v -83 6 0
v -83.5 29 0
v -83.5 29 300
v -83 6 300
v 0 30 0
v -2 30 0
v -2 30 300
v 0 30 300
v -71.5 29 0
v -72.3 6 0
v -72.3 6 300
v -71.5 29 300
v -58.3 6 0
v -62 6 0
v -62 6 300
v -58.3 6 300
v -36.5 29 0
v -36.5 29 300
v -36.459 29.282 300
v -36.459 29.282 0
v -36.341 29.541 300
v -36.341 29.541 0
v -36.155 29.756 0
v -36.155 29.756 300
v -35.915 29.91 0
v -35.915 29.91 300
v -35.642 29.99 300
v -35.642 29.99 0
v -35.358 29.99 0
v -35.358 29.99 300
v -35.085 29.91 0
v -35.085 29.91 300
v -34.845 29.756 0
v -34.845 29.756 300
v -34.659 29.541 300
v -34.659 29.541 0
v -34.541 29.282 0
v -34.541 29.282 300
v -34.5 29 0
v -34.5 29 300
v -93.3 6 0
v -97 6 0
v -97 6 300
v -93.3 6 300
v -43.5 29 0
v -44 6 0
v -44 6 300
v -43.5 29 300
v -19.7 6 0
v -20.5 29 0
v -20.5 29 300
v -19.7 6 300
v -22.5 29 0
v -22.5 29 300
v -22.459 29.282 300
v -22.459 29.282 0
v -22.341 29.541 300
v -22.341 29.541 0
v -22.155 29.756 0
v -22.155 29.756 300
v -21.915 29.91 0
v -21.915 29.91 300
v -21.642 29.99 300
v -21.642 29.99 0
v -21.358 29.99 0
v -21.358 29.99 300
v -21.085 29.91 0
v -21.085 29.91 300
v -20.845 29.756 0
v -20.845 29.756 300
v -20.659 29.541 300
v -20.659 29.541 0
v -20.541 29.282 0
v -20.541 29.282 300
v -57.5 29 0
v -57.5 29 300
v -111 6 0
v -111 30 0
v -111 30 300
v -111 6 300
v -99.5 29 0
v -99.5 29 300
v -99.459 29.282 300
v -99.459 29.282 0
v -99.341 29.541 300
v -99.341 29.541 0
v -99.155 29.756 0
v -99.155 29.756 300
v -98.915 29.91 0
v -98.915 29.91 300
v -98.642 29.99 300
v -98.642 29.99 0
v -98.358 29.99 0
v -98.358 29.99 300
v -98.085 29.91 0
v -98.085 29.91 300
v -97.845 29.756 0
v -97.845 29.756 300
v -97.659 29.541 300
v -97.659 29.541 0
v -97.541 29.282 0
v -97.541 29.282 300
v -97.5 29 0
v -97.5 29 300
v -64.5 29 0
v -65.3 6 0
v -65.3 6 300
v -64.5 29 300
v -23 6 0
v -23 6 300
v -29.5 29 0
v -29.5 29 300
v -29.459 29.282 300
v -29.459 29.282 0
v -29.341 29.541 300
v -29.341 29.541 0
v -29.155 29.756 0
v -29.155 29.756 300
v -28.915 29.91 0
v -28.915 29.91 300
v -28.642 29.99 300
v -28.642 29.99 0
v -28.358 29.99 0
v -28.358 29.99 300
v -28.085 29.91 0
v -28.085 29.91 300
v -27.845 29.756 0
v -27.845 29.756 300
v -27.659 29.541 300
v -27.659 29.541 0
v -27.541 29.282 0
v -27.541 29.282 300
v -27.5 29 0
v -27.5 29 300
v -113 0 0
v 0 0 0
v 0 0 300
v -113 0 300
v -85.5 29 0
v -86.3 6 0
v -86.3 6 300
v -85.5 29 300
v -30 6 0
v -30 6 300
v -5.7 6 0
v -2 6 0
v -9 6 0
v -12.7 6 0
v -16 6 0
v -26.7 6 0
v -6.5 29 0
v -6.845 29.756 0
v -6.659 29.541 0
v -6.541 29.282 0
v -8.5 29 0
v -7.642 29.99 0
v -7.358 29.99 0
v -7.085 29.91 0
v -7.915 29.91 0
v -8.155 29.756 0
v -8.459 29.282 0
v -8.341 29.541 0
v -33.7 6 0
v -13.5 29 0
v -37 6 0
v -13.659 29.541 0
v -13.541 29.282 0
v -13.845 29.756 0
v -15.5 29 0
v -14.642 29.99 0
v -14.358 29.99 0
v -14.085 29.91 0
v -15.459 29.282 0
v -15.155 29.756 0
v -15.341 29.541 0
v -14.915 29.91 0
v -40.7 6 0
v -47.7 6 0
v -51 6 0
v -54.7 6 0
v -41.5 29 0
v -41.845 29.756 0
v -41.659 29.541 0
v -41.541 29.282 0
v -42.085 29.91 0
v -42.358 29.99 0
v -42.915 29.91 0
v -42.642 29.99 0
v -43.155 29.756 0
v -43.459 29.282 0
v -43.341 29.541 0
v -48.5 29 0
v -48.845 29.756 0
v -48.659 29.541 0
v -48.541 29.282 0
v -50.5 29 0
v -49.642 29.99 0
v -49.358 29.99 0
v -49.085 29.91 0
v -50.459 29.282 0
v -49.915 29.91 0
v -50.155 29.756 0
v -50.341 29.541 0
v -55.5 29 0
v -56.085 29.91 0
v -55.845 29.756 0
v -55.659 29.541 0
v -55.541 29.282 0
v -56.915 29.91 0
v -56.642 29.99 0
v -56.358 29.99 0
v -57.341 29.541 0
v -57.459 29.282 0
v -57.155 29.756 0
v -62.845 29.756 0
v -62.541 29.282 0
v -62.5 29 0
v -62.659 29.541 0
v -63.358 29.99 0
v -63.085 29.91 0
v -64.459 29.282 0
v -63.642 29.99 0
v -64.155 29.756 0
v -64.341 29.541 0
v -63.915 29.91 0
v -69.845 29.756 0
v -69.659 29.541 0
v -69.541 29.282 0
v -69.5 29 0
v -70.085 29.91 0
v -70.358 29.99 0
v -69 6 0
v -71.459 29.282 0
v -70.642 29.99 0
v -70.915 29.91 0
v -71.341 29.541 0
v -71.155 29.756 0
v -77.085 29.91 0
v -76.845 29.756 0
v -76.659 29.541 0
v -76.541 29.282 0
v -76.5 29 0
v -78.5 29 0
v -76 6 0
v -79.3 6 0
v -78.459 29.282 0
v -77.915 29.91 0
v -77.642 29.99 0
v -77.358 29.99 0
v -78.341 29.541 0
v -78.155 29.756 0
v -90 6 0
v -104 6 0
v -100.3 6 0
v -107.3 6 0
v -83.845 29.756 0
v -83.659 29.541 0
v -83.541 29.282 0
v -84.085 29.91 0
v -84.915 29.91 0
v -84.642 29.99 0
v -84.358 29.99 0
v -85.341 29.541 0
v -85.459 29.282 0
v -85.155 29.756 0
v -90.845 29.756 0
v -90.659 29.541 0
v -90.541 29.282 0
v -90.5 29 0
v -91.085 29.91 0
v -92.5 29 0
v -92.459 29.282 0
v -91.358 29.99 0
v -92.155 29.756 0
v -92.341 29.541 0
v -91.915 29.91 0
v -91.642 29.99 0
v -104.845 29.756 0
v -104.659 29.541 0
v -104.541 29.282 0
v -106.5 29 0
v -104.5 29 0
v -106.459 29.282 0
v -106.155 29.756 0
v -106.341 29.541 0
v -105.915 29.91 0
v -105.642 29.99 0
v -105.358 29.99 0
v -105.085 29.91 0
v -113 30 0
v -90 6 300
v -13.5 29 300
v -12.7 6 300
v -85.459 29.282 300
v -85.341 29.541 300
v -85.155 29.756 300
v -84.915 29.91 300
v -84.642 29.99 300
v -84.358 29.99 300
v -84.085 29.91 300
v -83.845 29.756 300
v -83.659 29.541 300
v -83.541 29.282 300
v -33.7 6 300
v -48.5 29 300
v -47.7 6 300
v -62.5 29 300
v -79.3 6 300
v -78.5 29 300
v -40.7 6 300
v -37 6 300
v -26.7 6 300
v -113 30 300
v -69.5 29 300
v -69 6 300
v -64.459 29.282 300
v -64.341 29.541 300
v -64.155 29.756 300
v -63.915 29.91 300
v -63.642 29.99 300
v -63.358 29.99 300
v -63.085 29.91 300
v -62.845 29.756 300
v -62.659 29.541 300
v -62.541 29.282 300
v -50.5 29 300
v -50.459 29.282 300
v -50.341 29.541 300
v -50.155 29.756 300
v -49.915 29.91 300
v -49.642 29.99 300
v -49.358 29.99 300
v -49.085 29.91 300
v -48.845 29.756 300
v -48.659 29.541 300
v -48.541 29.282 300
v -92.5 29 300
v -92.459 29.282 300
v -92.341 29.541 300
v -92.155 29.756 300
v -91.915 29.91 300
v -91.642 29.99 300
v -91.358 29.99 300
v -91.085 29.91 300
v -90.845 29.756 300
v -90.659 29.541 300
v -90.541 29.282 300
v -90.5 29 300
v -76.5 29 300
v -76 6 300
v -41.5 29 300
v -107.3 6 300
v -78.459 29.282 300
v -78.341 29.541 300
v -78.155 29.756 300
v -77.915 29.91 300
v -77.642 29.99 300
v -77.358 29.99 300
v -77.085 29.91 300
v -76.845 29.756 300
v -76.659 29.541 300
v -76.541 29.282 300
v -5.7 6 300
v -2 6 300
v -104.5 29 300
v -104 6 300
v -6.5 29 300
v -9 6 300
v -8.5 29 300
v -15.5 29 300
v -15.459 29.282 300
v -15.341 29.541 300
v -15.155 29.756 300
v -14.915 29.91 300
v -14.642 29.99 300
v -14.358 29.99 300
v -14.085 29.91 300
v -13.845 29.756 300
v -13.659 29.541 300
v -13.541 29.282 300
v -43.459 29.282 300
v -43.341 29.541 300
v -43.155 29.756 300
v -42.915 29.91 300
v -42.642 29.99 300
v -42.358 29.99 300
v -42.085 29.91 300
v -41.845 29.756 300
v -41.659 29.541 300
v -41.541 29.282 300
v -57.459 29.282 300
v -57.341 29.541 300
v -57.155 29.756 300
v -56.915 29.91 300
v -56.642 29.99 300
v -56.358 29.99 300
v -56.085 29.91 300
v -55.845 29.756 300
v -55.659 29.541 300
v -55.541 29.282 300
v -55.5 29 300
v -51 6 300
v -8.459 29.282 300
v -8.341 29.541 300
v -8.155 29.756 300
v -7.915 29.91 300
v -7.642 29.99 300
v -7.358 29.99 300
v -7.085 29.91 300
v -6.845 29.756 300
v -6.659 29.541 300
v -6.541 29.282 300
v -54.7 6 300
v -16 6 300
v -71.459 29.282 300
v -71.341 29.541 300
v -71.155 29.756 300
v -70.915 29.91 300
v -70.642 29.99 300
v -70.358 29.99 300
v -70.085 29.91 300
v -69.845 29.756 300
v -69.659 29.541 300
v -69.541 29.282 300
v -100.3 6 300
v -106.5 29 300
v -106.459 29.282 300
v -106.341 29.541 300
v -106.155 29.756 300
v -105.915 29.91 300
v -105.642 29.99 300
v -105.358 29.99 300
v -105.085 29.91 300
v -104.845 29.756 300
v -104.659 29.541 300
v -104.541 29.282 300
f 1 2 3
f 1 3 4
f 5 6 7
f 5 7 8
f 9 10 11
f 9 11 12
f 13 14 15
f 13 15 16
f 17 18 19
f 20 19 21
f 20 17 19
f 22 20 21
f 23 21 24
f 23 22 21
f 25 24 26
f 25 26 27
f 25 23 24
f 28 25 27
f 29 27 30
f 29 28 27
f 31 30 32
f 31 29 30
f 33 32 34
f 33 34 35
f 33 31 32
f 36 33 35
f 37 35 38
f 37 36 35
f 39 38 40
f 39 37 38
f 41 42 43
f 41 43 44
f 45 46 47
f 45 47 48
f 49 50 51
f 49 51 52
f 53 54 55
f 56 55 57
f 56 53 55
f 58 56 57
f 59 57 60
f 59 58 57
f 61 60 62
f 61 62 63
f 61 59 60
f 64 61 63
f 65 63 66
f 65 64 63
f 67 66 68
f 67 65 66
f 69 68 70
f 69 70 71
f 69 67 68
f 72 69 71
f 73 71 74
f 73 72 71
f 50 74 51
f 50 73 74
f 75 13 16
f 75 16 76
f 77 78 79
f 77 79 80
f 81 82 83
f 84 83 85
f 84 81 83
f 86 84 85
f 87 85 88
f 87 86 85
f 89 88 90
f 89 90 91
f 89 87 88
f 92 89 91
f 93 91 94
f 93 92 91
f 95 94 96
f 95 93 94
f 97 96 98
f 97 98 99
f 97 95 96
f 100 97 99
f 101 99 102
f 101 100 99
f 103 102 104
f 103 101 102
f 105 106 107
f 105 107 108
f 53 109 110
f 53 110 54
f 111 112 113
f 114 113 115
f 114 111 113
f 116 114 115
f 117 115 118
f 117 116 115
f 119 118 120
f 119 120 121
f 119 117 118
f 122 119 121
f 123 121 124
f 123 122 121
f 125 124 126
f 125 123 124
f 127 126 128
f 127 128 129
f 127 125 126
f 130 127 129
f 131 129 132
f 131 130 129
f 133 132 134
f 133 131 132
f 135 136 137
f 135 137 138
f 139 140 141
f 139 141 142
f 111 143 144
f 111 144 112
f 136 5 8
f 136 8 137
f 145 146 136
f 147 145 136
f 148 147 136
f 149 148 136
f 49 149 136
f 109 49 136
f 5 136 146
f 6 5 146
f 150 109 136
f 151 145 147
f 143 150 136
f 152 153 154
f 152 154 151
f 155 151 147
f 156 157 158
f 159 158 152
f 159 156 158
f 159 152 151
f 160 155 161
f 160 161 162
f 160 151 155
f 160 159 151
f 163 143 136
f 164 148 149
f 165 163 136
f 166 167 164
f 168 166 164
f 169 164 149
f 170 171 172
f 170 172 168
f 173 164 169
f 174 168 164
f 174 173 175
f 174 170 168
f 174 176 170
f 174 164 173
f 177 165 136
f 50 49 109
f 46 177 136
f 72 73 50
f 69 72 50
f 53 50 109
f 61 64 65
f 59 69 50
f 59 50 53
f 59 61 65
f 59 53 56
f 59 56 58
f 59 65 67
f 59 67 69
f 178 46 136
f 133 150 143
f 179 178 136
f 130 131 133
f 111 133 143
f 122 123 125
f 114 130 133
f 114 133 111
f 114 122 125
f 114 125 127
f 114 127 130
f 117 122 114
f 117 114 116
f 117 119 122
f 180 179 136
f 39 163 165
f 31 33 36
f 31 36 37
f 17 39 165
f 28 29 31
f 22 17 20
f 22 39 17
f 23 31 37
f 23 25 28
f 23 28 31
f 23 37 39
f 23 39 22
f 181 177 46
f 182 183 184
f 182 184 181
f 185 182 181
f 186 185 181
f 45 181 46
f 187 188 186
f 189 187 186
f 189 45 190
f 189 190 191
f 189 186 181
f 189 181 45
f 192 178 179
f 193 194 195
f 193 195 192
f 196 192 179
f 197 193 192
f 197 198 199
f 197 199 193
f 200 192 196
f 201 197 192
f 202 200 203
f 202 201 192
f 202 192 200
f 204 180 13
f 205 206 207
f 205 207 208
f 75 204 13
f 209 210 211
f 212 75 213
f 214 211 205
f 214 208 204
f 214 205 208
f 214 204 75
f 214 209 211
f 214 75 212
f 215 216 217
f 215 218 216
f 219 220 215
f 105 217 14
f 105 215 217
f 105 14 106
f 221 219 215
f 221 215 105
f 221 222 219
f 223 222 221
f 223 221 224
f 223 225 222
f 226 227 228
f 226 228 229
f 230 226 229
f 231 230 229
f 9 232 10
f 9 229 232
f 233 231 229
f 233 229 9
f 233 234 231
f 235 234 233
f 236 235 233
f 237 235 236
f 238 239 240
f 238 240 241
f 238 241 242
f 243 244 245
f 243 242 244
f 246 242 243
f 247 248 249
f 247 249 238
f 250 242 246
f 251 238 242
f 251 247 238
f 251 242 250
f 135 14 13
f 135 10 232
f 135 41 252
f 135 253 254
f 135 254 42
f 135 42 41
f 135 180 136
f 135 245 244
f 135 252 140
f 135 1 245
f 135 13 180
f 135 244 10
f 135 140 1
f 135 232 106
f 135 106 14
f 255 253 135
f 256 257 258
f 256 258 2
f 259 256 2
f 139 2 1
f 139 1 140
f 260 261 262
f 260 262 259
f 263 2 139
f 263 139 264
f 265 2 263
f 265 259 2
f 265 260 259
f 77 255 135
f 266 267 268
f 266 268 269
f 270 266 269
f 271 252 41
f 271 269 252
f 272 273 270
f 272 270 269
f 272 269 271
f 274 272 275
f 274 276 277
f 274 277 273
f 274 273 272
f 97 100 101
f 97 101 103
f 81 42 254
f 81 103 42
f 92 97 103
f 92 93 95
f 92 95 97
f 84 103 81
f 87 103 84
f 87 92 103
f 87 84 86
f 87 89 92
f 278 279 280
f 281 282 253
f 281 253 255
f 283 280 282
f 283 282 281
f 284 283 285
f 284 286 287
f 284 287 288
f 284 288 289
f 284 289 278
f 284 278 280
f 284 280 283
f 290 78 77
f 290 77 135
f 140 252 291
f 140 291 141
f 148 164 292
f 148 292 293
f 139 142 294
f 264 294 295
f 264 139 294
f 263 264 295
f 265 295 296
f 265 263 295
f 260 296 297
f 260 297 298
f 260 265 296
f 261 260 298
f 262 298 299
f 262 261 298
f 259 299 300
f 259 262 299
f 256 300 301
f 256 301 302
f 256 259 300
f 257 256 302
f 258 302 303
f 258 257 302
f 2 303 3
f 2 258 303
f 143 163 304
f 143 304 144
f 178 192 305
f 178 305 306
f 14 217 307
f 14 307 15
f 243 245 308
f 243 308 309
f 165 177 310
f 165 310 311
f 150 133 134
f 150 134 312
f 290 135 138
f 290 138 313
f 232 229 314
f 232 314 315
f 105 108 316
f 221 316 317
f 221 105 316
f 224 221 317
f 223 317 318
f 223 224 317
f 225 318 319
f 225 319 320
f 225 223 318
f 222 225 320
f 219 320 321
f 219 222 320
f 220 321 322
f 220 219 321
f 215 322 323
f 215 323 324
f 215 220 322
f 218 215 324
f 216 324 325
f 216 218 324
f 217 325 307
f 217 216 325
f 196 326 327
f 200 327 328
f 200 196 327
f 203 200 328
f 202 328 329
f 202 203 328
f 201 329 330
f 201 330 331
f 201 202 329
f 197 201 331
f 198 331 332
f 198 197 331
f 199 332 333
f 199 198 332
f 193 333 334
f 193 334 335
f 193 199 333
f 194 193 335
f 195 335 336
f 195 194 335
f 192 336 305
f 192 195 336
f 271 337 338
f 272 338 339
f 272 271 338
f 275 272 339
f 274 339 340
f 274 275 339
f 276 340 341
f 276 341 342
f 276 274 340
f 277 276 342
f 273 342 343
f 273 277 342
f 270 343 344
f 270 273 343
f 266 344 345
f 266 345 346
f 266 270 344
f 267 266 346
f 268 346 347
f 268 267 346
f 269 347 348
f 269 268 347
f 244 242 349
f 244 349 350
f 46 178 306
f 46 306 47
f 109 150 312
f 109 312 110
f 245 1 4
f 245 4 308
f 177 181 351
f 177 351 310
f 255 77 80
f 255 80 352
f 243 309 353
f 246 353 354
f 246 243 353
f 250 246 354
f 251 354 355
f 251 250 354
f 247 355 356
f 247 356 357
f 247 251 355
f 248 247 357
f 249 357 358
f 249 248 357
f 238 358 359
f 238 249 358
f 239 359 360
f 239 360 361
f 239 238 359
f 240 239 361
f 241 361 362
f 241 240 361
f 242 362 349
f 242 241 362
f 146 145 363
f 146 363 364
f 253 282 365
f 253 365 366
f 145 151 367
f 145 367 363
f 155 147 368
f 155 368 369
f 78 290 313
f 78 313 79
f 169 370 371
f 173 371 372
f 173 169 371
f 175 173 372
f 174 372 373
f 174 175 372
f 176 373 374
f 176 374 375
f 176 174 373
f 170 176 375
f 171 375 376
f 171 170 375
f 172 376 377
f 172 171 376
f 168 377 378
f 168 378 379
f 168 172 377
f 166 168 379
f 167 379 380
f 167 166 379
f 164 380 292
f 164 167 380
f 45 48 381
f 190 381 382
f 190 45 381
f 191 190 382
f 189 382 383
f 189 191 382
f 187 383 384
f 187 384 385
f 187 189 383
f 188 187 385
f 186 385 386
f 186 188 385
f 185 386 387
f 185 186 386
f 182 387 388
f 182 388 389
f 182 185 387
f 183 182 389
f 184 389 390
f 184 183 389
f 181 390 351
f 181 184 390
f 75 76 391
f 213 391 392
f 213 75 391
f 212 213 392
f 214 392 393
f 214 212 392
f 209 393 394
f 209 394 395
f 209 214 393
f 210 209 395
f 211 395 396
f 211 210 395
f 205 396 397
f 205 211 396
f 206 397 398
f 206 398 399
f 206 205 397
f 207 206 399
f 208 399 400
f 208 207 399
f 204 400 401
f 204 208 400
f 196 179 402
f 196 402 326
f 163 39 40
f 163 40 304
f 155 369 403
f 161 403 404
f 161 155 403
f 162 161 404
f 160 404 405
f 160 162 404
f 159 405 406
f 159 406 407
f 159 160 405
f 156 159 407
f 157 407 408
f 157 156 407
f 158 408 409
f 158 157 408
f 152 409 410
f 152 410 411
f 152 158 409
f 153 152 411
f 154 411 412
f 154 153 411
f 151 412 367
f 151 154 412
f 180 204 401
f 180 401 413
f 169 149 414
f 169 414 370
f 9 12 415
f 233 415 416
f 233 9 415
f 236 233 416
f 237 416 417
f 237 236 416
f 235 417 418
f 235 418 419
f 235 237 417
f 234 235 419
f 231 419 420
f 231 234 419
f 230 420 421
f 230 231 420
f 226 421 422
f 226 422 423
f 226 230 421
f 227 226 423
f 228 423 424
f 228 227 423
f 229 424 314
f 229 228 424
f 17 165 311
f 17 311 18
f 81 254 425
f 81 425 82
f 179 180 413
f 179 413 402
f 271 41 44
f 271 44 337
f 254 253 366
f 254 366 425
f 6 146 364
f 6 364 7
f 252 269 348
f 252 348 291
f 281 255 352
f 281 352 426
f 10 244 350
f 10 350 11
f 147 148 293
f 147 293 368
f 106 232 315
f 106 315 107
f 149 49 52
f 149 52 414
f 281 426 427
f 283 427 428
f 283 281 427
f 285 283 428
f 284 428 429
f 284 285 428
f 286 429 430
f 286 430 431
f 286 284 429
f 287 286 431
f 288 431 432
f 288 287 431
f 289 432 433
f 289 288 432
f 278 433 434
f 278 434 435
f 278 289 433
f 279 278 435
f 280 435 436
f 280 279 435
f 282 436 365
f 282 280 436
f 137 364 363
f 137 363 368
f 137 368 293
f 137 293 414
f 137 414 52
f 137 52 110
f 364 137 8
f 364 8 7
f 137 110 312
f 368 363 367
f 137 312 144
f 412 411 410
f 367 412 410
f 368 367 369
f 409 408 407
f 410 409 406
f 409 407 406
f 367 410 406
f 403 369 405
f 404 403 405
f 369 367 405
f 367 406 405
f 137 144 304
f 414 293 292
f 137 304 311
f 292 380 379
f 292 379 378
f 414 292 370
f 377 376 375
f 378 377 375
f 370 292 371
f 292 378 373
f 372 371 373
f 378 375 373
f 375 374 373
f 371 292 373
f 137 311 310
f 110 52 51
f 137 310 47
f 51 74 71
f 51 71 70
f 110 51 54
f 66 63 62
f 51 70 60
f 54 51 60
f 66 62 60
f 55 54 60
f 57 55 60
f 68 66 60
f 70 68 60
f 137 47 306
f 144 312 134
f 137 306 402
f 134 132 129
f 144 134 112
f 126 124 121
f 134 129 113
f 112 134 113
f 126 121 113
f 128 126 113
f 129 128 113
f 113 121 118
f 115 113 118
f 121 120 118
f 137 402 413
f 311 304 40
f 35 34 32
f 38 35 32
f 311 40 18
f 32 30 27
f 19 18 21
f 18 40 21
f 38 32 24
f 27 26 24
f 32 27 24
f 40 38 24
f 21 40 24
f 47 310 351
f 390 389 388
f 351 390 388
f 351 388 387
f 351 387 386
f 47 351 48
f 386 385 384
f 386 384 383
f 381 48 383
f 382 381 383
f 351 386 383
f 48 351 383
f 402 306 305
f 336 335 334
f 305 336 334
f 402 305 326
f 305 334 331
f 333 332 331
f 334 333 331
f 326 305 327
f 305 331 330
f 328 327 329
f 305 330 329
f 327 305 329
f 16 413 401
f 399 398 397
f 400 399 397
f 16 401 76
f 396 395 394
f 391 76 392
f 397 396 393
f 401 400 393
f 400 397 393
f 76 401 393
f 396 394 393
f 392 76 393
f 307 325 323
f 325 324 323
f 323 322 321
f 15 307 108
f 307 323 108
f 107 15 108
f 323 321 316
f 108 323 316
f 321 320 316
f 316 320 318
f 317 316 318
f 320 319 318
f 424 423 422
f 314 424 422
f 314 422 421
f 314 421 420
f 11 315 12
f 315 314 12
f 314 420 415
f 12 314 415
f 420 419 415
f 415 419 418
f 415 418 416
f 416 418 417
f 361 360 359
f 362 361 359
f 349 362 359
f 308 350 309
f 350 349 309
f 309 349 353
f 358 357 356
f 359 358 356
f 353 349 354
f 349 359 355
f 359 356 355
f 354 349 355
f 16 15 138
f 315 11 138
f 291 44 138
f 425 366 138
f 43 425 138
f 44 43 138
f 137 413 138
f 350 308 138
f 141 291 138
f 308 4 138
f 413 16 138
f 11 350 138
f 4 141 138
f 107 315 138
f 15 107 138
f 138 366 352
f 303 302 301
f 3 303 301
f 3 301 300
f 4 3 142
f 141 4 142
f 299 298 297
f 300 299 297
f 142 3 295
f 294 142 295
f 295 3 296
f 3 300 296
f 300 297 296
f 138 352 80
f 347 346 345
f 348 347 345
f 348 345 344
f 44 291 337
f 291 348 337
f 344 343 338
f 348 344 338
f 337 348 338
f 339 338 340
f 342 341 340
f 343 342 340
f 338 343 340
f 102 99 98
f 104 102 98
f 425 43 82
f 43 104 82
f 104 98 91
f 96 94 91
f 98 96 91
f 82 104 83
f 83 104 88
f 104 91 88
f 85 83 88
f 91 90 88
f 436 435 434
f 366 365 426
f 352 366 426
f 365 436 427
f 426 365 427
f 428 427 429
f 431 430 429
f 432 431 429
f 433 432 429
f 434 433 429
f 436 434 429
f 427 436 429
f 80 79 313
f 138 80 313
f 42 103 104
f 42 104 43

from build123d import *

# Parameters (mm, degrees)
RESSALTO_EXTRUS_O1_DEPTH = 300


with BuildPart() as part:
    # Esboço1 → Ressalto-extrusão1 (new body)
    with BuildSketch(Plane.XY):
        with BuildLine():
            Line((0, 0), (-113, 0))
            Line((-113, 0), (-113, 30))
            Line((-113, 30), (-111, 30))
            Line((-111, 30), (-111, 6))
            Line((-111, 6), (-107.3, 6))
            Line((-107.3, 6), (-106.5, 29))
            ThreePointArc((-106.5, 29), (-105.5, 30), (-104.5, 29))
            Line((-104.5, 29), (-104, 6))
            Line((-104, 6), (-100.3, 6))
            Line((-100.3, 6), (-99.5, 29))
            ThreePointArc((-99.5, 29), (-98.5, 30), (-97.5, 29))
            Line((-97.5, 29), (-97, 6))
            Line((-97, 6), (-93.3, 6))
            Line((-93.3, 6), (-92.5, 29))
            ThreePointArc((-92.5, 29), (-91.5, 30), (-90.5, 29))
            Line((-90.5, 29), (-90, 6))
            Line((-90, 6), (-86.3, 6))
            Line((-86.3, 6), (-85.5, 29))
            ThreePointArc((-85.5, 29), (-84.5, 30), (-83.5, 29))
            Line((-83.5, 29), (-83, 6))
            Line((-83, 6), (-79.3, 6))
            Line((-79.3, 6), (-78.5, 29))
            ThreePointArc((-78.5, 29), (-77.5, 30), (-76.5, 29))
            Line((-76.5, 29), (-76, 6))
            Line((-76, 6), (-72.3, 6))
            Line((-72.3, 6), (-71.5, 29))
            ThreePointArc((-71.5, 29), (-70.5, 30), (-69.5, 29))
            Line((-69.5, 29), (-69, 6))
            Line((-69, 6), (-65.3, 6))
            Line((-65.3, 6), (-64.5, 29))
            ThreePointArc((-64.5, 29), (-63.5, 30), (-62.5, 29))
            Line((-62.5, 29), (-62, 6))
            Line((-62, 6), (-58.3, 6))
            Line((-58.3, 6), (-57.5, 29))
            ThreePointArc((-57.5, 29), (-56.5, 30), (-55.5, 29))
            Line((-55.5, 29), (-54.7, 6))
            Line((-54.7, 6), (-51, 6))
            Line((-51, 6), (-50.5, 29))
            ThreePointArc((-50.5, 29), (-49.5, 30), (-48.5, 29))
            Line((-48.5, 29), (-47.7, 6))
            Line((-47.7, 6), (-44, 6))
            Line((-44, 6), (-43.5, 29))
            ThreePointArc((-43.5, 29), (-42.5, 30), (-41.5, 29))
            Line((-41.5, 29), (-40.7, 6))
            Line((-40.7, 6), (-37, 6))
            Line((-37, 6), (-36.5, 29))
            ThreePointArc((-36.5, 29), (-35.5, 30), (-34.5, 29))
            Line((-34.5, 29), (-33.7, 6))
            Line((-33.7, 6), (-30, 6))
            Line((-30, 6), (-29.5, 29))
            ThreePointArc((-29.5, 29), (-28.5, 30), (-27.5, 29))
            Line((-27.5, 29), (-26.7, 6))
            Line((-26.7, 6), (-23, 6))
            Line((-23, 6), (-22.5, 29))
            ThreePointArc((-22.5, 29), (-21.5, 30), (-20.5, 29))
            Line((-20.5, 29), (-19.7, 6))
            Line((-19.7, 6), (-16, 6))
            Line((-16, 6), (-15.5, 29))
            ThreePointArc((-15.5, 29), (-14.5, 30), (-13.5, 29))
            Line((-13.5, 29), (-12.7, 6))
            Line((-12.7, 6), (-9, 6))
            Line((-9, 6), (-8.5, 29))
            ThreePointArc((-8.5, 29), (-7.5, 30), (-6.5, 29))
            Line((-6.5, 29), (-5.7, 6))
            Line((-5.7, 6), (-2, 6))
            Line((-2, 6), (-2, 30))
            Line((-2, 30), (0, 30))
            Line((0, 30), (0, 0))
        make_face()
    extrude(amount=RESSALTO_EXTRUS_O1_DEPTH)


solid = part.part
